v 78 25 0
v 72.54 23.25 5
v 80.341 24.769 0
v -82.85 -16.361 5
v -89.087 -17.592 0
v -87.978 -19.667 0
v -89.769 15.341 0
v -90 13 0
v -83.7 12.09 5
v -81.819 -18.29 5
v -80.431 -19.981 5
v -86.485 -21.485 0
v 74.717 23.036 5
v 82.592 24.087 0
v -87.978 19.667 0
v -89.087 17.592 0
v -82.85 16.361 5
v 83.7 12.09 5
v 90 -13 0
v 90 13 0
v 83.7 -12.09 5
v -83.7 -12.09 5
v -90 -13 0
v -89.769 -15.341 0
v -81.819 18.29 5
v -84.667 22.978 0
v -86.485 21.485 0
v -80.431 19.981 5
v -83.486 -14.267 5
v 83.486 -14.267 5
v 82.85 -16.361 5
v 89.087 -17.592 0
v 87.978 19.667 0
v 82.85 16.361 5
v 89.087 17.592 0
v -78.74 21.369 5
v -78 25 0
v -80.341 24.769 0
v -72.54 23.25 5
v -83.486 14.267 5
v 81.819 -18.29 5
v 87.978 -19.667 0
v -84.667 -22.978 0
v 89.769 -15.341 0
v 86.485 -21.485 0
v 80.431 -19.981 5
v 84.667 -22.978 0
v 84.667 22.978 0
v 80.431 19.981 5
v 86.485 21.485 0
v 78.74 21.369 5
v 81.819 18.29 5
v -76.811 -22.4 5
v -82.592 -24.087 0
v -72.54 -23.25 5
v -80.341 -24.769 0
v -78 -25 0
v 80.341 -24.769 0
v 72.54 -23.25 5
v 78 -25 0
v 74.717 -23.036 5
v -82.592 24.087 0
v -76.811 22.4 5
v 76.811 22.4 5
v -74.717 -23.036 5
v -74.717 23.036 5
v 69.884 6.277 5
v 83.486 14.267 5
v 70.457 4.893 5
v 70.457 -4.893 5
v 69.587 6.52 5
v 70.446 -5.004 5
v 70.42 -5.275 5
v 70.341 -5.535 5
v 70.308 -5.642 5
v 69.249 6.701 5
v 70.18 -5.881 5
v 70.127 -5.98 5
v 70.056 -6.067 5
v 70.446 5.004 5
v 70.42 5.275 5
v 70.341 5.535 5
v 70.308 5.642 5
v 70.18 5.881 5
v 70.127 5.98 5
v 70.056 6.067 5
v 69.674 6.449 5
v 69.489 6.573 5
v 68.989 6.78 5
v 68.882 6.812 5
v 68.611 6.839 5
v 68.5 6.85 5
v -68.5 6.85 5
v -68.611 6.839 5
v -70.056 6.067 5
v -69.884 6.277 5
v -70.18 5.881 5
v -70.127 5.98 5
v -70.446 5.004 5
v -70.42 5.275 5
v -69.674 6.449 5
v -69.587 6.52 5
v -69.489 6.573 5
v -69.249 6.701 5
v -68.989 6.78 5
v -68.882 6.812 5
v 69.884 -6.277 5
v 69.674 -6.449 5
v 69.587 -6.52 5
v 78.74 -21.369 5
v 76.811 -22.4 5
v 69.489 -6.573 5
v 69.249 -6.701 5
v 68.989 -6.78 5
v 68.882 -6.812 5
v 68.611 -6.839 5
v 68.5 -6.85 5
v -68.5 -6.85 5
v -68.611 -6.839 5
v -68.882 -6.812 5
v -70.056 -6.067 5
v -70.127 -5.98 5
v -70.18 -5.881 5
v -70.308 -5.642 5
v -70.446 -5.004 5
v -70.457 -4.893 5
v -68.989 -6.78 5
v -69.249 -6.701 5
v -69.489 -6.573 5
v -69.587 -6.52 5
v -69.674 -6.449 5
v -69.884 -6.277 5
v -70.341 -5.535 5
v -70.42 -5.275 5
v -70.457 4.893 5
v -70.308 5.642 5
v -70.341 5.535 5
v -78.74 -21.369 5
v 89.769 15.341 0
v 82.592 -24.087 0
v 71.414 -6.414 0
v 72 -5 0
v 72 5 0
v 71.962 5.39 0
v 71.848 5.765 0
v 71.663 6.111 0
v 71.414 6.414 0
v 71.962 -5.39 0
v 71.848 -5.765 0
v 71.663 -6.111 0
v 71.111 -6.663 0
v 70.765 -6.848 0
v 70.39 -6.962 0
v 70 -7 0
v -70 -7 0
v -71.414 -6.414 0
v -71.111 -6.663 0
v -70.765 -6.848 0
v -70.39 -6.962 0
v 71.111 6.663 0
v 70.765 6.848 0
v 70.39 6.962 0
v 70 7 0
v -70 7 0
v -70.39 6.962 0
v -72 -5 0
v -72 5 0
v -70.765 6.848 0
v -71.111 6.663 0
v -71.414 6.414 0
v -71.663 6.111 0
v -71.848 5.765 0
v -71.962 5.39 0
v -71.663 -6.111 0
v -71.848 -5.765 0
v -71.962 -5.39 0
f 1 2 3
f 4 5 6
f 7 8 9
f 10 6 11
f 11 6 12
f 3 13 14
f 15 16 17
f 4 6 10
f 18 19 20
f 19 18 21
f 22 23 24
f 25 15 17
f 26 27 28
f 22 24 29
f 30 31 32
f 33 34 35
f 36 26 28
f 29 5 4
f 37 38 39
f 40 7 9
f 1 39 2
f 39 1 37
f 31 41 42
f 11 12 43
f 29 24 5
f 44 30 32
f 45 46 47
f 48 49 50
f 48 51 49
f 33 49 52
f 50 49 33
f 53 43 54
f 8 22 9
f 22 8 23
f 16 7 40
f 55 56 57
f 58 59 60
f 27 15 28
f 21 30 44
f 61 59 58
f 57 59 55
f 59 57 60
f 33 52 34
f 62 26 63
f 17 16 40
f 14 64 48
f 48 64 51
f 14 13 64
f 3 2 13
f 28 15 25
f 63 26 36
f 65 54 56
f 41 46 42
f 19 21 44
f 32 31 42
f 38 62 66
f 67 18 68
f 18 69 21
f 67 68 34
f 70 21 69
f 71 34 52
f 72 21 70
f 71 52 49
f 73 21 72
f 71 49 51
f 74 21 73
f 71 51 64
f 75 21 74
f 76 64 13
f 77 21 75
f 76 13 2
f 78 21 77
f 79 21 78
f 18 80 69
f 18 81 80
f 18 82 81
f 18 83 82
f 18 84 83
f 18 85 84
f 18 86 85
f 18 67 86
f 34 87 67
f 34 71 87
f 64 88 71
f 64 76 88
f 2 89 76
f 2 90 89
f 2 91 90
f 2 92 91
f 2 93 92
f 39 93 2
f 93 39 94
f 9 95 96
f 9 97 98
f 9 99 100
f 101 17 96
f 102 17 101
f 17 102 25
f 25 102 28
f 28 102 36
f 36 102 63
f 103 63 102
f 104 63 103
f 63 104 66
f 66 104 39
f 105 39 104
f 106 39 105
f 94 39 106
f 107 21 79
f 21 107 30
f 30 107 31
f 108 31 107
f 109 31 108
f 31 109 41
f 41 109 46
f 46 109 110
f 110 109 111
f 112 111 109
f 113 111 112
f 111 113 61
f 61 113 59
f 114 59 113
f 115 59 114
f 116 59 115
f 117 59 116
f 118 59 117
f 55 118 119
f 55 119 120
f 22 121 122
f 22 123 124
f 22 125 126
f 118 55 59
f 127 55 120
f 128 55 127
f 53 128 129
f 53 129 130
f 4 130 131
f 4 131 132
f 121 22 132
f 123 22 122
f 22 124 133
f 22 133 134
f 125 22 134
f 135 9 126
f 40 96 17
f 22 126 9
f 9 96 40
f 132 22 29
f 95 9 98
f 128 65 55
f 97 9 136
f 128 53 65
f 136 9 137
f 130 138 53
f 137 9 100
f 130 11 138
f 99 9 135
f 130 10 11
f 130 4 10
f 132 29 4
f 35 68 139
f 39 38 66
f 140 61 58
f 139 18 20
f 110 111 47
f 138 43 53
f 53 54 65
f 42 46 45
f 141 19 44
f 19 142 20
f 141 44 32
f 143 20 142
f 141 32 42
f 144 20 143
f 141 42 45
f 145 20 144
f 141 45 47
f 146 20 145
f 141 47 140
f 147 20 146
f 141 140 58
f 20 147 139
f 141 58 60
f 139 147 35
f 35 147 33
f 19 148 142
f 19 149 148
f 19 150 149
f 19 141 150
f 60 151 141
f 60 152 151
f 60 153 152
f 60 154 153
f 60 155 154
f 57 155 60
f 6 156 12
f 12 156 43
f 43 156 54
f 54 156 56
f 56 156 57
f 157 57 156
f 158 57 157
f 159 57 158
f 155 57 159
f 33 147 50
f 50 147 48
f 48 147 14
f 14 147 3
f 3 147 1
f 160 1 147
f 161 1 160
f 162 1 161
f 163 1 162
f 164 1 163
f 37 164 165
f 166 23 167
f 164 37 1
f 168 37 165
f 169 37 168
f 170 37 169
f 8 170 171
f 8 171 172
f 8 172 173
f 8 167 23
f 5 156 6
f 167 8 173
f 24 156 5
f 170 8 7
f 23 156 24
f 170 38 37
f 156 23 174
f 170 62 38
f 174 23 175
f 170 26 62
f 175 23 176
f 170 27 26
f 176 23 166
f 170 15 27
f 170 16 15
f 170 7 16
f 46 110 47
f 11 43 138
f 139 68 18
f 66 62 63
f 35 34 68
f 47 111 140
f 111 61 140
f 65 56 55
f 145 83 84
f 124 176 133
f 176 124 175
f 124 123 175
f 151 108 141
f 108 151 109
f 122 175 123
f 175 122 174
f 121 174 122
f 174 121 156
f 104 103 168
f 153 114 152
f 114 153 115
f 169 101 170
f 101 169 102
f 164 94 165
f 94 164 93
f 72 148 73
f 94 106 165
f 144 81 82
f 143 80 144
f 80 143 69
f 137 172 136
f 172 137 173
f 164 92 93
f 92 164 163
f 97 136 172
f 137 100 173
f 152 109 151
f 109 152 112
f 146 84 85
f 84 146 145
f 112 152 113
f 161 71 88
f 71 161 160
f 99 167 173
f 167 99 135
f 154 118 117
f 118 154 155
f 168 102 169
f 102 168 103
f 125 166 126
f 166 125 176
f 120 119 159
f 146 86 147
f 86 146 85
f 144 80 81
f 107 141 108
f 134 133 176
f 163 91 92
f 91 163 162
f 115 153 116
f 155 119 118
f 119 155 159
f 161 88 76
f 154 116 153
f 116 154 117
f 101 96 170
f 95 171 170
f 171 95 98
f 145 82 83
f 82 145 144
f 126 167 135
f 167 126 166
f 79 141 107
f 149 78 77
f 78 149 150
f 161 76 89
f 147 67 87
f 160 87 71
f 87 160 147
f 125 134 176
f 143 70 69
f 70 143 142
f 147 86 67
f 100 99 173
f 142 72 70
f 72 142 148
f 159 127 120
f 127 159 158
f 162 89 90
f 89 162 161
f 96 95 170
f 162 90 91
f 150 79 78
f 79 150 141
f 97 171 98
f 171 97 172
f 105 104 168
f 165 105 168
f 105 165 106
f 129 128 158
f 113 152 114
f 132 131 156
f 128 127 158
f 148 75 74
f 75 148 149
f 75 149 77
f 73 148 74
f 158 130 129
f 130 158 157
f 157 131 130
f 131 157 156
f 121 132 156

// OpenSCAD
$fn = 32;

// ----------------------------------------------------------------------
// Display bezel: 180 x 50 mm frame, opening 144x14 mm
// ----------------------------------------------------------------------

// --- parameters (mm) ---
length = 180;             // frame outside length, X
width = 50;               // frame outside width, Y
frame_w = 18;             // frame width
thickness = 5;            // frame thickness
corner_r = 12;            // outside corner radius
chamfer = 0.93;           // outer wall taper
funnel = 0.97;            // inner opening taper
opening_l = 144;          // opening length
opening_w = 14;           // opening width
inner_r = 2;              // opening corner radius

/* rounded-rectangle outlines, generated with loops */
module rounded_ring(l_nom, w_nom, r) {
  hull() {
    for (sx = [-1, 1]) for (sy = [-1, 1])
      translate([sx * (l_nom / 2 - r), sy * (w_nom / 2 - r)]) circle(r = r);
  }
}

difference() {
  /* frame body, drafted so the outer edge is a variable-depth chamfer */
  linear_extrude(height = thickness, scale = chamfer)
    rounded_ring(length, width, corner_r);
  /* viewing opening, drafted the other way for a funnel edge */
  linear_extrude(height = thickness + 2, scale = funnel)
    translate([0, 0, -1]) rounded_ring(opening_l, opening_w, inner_r);
}
